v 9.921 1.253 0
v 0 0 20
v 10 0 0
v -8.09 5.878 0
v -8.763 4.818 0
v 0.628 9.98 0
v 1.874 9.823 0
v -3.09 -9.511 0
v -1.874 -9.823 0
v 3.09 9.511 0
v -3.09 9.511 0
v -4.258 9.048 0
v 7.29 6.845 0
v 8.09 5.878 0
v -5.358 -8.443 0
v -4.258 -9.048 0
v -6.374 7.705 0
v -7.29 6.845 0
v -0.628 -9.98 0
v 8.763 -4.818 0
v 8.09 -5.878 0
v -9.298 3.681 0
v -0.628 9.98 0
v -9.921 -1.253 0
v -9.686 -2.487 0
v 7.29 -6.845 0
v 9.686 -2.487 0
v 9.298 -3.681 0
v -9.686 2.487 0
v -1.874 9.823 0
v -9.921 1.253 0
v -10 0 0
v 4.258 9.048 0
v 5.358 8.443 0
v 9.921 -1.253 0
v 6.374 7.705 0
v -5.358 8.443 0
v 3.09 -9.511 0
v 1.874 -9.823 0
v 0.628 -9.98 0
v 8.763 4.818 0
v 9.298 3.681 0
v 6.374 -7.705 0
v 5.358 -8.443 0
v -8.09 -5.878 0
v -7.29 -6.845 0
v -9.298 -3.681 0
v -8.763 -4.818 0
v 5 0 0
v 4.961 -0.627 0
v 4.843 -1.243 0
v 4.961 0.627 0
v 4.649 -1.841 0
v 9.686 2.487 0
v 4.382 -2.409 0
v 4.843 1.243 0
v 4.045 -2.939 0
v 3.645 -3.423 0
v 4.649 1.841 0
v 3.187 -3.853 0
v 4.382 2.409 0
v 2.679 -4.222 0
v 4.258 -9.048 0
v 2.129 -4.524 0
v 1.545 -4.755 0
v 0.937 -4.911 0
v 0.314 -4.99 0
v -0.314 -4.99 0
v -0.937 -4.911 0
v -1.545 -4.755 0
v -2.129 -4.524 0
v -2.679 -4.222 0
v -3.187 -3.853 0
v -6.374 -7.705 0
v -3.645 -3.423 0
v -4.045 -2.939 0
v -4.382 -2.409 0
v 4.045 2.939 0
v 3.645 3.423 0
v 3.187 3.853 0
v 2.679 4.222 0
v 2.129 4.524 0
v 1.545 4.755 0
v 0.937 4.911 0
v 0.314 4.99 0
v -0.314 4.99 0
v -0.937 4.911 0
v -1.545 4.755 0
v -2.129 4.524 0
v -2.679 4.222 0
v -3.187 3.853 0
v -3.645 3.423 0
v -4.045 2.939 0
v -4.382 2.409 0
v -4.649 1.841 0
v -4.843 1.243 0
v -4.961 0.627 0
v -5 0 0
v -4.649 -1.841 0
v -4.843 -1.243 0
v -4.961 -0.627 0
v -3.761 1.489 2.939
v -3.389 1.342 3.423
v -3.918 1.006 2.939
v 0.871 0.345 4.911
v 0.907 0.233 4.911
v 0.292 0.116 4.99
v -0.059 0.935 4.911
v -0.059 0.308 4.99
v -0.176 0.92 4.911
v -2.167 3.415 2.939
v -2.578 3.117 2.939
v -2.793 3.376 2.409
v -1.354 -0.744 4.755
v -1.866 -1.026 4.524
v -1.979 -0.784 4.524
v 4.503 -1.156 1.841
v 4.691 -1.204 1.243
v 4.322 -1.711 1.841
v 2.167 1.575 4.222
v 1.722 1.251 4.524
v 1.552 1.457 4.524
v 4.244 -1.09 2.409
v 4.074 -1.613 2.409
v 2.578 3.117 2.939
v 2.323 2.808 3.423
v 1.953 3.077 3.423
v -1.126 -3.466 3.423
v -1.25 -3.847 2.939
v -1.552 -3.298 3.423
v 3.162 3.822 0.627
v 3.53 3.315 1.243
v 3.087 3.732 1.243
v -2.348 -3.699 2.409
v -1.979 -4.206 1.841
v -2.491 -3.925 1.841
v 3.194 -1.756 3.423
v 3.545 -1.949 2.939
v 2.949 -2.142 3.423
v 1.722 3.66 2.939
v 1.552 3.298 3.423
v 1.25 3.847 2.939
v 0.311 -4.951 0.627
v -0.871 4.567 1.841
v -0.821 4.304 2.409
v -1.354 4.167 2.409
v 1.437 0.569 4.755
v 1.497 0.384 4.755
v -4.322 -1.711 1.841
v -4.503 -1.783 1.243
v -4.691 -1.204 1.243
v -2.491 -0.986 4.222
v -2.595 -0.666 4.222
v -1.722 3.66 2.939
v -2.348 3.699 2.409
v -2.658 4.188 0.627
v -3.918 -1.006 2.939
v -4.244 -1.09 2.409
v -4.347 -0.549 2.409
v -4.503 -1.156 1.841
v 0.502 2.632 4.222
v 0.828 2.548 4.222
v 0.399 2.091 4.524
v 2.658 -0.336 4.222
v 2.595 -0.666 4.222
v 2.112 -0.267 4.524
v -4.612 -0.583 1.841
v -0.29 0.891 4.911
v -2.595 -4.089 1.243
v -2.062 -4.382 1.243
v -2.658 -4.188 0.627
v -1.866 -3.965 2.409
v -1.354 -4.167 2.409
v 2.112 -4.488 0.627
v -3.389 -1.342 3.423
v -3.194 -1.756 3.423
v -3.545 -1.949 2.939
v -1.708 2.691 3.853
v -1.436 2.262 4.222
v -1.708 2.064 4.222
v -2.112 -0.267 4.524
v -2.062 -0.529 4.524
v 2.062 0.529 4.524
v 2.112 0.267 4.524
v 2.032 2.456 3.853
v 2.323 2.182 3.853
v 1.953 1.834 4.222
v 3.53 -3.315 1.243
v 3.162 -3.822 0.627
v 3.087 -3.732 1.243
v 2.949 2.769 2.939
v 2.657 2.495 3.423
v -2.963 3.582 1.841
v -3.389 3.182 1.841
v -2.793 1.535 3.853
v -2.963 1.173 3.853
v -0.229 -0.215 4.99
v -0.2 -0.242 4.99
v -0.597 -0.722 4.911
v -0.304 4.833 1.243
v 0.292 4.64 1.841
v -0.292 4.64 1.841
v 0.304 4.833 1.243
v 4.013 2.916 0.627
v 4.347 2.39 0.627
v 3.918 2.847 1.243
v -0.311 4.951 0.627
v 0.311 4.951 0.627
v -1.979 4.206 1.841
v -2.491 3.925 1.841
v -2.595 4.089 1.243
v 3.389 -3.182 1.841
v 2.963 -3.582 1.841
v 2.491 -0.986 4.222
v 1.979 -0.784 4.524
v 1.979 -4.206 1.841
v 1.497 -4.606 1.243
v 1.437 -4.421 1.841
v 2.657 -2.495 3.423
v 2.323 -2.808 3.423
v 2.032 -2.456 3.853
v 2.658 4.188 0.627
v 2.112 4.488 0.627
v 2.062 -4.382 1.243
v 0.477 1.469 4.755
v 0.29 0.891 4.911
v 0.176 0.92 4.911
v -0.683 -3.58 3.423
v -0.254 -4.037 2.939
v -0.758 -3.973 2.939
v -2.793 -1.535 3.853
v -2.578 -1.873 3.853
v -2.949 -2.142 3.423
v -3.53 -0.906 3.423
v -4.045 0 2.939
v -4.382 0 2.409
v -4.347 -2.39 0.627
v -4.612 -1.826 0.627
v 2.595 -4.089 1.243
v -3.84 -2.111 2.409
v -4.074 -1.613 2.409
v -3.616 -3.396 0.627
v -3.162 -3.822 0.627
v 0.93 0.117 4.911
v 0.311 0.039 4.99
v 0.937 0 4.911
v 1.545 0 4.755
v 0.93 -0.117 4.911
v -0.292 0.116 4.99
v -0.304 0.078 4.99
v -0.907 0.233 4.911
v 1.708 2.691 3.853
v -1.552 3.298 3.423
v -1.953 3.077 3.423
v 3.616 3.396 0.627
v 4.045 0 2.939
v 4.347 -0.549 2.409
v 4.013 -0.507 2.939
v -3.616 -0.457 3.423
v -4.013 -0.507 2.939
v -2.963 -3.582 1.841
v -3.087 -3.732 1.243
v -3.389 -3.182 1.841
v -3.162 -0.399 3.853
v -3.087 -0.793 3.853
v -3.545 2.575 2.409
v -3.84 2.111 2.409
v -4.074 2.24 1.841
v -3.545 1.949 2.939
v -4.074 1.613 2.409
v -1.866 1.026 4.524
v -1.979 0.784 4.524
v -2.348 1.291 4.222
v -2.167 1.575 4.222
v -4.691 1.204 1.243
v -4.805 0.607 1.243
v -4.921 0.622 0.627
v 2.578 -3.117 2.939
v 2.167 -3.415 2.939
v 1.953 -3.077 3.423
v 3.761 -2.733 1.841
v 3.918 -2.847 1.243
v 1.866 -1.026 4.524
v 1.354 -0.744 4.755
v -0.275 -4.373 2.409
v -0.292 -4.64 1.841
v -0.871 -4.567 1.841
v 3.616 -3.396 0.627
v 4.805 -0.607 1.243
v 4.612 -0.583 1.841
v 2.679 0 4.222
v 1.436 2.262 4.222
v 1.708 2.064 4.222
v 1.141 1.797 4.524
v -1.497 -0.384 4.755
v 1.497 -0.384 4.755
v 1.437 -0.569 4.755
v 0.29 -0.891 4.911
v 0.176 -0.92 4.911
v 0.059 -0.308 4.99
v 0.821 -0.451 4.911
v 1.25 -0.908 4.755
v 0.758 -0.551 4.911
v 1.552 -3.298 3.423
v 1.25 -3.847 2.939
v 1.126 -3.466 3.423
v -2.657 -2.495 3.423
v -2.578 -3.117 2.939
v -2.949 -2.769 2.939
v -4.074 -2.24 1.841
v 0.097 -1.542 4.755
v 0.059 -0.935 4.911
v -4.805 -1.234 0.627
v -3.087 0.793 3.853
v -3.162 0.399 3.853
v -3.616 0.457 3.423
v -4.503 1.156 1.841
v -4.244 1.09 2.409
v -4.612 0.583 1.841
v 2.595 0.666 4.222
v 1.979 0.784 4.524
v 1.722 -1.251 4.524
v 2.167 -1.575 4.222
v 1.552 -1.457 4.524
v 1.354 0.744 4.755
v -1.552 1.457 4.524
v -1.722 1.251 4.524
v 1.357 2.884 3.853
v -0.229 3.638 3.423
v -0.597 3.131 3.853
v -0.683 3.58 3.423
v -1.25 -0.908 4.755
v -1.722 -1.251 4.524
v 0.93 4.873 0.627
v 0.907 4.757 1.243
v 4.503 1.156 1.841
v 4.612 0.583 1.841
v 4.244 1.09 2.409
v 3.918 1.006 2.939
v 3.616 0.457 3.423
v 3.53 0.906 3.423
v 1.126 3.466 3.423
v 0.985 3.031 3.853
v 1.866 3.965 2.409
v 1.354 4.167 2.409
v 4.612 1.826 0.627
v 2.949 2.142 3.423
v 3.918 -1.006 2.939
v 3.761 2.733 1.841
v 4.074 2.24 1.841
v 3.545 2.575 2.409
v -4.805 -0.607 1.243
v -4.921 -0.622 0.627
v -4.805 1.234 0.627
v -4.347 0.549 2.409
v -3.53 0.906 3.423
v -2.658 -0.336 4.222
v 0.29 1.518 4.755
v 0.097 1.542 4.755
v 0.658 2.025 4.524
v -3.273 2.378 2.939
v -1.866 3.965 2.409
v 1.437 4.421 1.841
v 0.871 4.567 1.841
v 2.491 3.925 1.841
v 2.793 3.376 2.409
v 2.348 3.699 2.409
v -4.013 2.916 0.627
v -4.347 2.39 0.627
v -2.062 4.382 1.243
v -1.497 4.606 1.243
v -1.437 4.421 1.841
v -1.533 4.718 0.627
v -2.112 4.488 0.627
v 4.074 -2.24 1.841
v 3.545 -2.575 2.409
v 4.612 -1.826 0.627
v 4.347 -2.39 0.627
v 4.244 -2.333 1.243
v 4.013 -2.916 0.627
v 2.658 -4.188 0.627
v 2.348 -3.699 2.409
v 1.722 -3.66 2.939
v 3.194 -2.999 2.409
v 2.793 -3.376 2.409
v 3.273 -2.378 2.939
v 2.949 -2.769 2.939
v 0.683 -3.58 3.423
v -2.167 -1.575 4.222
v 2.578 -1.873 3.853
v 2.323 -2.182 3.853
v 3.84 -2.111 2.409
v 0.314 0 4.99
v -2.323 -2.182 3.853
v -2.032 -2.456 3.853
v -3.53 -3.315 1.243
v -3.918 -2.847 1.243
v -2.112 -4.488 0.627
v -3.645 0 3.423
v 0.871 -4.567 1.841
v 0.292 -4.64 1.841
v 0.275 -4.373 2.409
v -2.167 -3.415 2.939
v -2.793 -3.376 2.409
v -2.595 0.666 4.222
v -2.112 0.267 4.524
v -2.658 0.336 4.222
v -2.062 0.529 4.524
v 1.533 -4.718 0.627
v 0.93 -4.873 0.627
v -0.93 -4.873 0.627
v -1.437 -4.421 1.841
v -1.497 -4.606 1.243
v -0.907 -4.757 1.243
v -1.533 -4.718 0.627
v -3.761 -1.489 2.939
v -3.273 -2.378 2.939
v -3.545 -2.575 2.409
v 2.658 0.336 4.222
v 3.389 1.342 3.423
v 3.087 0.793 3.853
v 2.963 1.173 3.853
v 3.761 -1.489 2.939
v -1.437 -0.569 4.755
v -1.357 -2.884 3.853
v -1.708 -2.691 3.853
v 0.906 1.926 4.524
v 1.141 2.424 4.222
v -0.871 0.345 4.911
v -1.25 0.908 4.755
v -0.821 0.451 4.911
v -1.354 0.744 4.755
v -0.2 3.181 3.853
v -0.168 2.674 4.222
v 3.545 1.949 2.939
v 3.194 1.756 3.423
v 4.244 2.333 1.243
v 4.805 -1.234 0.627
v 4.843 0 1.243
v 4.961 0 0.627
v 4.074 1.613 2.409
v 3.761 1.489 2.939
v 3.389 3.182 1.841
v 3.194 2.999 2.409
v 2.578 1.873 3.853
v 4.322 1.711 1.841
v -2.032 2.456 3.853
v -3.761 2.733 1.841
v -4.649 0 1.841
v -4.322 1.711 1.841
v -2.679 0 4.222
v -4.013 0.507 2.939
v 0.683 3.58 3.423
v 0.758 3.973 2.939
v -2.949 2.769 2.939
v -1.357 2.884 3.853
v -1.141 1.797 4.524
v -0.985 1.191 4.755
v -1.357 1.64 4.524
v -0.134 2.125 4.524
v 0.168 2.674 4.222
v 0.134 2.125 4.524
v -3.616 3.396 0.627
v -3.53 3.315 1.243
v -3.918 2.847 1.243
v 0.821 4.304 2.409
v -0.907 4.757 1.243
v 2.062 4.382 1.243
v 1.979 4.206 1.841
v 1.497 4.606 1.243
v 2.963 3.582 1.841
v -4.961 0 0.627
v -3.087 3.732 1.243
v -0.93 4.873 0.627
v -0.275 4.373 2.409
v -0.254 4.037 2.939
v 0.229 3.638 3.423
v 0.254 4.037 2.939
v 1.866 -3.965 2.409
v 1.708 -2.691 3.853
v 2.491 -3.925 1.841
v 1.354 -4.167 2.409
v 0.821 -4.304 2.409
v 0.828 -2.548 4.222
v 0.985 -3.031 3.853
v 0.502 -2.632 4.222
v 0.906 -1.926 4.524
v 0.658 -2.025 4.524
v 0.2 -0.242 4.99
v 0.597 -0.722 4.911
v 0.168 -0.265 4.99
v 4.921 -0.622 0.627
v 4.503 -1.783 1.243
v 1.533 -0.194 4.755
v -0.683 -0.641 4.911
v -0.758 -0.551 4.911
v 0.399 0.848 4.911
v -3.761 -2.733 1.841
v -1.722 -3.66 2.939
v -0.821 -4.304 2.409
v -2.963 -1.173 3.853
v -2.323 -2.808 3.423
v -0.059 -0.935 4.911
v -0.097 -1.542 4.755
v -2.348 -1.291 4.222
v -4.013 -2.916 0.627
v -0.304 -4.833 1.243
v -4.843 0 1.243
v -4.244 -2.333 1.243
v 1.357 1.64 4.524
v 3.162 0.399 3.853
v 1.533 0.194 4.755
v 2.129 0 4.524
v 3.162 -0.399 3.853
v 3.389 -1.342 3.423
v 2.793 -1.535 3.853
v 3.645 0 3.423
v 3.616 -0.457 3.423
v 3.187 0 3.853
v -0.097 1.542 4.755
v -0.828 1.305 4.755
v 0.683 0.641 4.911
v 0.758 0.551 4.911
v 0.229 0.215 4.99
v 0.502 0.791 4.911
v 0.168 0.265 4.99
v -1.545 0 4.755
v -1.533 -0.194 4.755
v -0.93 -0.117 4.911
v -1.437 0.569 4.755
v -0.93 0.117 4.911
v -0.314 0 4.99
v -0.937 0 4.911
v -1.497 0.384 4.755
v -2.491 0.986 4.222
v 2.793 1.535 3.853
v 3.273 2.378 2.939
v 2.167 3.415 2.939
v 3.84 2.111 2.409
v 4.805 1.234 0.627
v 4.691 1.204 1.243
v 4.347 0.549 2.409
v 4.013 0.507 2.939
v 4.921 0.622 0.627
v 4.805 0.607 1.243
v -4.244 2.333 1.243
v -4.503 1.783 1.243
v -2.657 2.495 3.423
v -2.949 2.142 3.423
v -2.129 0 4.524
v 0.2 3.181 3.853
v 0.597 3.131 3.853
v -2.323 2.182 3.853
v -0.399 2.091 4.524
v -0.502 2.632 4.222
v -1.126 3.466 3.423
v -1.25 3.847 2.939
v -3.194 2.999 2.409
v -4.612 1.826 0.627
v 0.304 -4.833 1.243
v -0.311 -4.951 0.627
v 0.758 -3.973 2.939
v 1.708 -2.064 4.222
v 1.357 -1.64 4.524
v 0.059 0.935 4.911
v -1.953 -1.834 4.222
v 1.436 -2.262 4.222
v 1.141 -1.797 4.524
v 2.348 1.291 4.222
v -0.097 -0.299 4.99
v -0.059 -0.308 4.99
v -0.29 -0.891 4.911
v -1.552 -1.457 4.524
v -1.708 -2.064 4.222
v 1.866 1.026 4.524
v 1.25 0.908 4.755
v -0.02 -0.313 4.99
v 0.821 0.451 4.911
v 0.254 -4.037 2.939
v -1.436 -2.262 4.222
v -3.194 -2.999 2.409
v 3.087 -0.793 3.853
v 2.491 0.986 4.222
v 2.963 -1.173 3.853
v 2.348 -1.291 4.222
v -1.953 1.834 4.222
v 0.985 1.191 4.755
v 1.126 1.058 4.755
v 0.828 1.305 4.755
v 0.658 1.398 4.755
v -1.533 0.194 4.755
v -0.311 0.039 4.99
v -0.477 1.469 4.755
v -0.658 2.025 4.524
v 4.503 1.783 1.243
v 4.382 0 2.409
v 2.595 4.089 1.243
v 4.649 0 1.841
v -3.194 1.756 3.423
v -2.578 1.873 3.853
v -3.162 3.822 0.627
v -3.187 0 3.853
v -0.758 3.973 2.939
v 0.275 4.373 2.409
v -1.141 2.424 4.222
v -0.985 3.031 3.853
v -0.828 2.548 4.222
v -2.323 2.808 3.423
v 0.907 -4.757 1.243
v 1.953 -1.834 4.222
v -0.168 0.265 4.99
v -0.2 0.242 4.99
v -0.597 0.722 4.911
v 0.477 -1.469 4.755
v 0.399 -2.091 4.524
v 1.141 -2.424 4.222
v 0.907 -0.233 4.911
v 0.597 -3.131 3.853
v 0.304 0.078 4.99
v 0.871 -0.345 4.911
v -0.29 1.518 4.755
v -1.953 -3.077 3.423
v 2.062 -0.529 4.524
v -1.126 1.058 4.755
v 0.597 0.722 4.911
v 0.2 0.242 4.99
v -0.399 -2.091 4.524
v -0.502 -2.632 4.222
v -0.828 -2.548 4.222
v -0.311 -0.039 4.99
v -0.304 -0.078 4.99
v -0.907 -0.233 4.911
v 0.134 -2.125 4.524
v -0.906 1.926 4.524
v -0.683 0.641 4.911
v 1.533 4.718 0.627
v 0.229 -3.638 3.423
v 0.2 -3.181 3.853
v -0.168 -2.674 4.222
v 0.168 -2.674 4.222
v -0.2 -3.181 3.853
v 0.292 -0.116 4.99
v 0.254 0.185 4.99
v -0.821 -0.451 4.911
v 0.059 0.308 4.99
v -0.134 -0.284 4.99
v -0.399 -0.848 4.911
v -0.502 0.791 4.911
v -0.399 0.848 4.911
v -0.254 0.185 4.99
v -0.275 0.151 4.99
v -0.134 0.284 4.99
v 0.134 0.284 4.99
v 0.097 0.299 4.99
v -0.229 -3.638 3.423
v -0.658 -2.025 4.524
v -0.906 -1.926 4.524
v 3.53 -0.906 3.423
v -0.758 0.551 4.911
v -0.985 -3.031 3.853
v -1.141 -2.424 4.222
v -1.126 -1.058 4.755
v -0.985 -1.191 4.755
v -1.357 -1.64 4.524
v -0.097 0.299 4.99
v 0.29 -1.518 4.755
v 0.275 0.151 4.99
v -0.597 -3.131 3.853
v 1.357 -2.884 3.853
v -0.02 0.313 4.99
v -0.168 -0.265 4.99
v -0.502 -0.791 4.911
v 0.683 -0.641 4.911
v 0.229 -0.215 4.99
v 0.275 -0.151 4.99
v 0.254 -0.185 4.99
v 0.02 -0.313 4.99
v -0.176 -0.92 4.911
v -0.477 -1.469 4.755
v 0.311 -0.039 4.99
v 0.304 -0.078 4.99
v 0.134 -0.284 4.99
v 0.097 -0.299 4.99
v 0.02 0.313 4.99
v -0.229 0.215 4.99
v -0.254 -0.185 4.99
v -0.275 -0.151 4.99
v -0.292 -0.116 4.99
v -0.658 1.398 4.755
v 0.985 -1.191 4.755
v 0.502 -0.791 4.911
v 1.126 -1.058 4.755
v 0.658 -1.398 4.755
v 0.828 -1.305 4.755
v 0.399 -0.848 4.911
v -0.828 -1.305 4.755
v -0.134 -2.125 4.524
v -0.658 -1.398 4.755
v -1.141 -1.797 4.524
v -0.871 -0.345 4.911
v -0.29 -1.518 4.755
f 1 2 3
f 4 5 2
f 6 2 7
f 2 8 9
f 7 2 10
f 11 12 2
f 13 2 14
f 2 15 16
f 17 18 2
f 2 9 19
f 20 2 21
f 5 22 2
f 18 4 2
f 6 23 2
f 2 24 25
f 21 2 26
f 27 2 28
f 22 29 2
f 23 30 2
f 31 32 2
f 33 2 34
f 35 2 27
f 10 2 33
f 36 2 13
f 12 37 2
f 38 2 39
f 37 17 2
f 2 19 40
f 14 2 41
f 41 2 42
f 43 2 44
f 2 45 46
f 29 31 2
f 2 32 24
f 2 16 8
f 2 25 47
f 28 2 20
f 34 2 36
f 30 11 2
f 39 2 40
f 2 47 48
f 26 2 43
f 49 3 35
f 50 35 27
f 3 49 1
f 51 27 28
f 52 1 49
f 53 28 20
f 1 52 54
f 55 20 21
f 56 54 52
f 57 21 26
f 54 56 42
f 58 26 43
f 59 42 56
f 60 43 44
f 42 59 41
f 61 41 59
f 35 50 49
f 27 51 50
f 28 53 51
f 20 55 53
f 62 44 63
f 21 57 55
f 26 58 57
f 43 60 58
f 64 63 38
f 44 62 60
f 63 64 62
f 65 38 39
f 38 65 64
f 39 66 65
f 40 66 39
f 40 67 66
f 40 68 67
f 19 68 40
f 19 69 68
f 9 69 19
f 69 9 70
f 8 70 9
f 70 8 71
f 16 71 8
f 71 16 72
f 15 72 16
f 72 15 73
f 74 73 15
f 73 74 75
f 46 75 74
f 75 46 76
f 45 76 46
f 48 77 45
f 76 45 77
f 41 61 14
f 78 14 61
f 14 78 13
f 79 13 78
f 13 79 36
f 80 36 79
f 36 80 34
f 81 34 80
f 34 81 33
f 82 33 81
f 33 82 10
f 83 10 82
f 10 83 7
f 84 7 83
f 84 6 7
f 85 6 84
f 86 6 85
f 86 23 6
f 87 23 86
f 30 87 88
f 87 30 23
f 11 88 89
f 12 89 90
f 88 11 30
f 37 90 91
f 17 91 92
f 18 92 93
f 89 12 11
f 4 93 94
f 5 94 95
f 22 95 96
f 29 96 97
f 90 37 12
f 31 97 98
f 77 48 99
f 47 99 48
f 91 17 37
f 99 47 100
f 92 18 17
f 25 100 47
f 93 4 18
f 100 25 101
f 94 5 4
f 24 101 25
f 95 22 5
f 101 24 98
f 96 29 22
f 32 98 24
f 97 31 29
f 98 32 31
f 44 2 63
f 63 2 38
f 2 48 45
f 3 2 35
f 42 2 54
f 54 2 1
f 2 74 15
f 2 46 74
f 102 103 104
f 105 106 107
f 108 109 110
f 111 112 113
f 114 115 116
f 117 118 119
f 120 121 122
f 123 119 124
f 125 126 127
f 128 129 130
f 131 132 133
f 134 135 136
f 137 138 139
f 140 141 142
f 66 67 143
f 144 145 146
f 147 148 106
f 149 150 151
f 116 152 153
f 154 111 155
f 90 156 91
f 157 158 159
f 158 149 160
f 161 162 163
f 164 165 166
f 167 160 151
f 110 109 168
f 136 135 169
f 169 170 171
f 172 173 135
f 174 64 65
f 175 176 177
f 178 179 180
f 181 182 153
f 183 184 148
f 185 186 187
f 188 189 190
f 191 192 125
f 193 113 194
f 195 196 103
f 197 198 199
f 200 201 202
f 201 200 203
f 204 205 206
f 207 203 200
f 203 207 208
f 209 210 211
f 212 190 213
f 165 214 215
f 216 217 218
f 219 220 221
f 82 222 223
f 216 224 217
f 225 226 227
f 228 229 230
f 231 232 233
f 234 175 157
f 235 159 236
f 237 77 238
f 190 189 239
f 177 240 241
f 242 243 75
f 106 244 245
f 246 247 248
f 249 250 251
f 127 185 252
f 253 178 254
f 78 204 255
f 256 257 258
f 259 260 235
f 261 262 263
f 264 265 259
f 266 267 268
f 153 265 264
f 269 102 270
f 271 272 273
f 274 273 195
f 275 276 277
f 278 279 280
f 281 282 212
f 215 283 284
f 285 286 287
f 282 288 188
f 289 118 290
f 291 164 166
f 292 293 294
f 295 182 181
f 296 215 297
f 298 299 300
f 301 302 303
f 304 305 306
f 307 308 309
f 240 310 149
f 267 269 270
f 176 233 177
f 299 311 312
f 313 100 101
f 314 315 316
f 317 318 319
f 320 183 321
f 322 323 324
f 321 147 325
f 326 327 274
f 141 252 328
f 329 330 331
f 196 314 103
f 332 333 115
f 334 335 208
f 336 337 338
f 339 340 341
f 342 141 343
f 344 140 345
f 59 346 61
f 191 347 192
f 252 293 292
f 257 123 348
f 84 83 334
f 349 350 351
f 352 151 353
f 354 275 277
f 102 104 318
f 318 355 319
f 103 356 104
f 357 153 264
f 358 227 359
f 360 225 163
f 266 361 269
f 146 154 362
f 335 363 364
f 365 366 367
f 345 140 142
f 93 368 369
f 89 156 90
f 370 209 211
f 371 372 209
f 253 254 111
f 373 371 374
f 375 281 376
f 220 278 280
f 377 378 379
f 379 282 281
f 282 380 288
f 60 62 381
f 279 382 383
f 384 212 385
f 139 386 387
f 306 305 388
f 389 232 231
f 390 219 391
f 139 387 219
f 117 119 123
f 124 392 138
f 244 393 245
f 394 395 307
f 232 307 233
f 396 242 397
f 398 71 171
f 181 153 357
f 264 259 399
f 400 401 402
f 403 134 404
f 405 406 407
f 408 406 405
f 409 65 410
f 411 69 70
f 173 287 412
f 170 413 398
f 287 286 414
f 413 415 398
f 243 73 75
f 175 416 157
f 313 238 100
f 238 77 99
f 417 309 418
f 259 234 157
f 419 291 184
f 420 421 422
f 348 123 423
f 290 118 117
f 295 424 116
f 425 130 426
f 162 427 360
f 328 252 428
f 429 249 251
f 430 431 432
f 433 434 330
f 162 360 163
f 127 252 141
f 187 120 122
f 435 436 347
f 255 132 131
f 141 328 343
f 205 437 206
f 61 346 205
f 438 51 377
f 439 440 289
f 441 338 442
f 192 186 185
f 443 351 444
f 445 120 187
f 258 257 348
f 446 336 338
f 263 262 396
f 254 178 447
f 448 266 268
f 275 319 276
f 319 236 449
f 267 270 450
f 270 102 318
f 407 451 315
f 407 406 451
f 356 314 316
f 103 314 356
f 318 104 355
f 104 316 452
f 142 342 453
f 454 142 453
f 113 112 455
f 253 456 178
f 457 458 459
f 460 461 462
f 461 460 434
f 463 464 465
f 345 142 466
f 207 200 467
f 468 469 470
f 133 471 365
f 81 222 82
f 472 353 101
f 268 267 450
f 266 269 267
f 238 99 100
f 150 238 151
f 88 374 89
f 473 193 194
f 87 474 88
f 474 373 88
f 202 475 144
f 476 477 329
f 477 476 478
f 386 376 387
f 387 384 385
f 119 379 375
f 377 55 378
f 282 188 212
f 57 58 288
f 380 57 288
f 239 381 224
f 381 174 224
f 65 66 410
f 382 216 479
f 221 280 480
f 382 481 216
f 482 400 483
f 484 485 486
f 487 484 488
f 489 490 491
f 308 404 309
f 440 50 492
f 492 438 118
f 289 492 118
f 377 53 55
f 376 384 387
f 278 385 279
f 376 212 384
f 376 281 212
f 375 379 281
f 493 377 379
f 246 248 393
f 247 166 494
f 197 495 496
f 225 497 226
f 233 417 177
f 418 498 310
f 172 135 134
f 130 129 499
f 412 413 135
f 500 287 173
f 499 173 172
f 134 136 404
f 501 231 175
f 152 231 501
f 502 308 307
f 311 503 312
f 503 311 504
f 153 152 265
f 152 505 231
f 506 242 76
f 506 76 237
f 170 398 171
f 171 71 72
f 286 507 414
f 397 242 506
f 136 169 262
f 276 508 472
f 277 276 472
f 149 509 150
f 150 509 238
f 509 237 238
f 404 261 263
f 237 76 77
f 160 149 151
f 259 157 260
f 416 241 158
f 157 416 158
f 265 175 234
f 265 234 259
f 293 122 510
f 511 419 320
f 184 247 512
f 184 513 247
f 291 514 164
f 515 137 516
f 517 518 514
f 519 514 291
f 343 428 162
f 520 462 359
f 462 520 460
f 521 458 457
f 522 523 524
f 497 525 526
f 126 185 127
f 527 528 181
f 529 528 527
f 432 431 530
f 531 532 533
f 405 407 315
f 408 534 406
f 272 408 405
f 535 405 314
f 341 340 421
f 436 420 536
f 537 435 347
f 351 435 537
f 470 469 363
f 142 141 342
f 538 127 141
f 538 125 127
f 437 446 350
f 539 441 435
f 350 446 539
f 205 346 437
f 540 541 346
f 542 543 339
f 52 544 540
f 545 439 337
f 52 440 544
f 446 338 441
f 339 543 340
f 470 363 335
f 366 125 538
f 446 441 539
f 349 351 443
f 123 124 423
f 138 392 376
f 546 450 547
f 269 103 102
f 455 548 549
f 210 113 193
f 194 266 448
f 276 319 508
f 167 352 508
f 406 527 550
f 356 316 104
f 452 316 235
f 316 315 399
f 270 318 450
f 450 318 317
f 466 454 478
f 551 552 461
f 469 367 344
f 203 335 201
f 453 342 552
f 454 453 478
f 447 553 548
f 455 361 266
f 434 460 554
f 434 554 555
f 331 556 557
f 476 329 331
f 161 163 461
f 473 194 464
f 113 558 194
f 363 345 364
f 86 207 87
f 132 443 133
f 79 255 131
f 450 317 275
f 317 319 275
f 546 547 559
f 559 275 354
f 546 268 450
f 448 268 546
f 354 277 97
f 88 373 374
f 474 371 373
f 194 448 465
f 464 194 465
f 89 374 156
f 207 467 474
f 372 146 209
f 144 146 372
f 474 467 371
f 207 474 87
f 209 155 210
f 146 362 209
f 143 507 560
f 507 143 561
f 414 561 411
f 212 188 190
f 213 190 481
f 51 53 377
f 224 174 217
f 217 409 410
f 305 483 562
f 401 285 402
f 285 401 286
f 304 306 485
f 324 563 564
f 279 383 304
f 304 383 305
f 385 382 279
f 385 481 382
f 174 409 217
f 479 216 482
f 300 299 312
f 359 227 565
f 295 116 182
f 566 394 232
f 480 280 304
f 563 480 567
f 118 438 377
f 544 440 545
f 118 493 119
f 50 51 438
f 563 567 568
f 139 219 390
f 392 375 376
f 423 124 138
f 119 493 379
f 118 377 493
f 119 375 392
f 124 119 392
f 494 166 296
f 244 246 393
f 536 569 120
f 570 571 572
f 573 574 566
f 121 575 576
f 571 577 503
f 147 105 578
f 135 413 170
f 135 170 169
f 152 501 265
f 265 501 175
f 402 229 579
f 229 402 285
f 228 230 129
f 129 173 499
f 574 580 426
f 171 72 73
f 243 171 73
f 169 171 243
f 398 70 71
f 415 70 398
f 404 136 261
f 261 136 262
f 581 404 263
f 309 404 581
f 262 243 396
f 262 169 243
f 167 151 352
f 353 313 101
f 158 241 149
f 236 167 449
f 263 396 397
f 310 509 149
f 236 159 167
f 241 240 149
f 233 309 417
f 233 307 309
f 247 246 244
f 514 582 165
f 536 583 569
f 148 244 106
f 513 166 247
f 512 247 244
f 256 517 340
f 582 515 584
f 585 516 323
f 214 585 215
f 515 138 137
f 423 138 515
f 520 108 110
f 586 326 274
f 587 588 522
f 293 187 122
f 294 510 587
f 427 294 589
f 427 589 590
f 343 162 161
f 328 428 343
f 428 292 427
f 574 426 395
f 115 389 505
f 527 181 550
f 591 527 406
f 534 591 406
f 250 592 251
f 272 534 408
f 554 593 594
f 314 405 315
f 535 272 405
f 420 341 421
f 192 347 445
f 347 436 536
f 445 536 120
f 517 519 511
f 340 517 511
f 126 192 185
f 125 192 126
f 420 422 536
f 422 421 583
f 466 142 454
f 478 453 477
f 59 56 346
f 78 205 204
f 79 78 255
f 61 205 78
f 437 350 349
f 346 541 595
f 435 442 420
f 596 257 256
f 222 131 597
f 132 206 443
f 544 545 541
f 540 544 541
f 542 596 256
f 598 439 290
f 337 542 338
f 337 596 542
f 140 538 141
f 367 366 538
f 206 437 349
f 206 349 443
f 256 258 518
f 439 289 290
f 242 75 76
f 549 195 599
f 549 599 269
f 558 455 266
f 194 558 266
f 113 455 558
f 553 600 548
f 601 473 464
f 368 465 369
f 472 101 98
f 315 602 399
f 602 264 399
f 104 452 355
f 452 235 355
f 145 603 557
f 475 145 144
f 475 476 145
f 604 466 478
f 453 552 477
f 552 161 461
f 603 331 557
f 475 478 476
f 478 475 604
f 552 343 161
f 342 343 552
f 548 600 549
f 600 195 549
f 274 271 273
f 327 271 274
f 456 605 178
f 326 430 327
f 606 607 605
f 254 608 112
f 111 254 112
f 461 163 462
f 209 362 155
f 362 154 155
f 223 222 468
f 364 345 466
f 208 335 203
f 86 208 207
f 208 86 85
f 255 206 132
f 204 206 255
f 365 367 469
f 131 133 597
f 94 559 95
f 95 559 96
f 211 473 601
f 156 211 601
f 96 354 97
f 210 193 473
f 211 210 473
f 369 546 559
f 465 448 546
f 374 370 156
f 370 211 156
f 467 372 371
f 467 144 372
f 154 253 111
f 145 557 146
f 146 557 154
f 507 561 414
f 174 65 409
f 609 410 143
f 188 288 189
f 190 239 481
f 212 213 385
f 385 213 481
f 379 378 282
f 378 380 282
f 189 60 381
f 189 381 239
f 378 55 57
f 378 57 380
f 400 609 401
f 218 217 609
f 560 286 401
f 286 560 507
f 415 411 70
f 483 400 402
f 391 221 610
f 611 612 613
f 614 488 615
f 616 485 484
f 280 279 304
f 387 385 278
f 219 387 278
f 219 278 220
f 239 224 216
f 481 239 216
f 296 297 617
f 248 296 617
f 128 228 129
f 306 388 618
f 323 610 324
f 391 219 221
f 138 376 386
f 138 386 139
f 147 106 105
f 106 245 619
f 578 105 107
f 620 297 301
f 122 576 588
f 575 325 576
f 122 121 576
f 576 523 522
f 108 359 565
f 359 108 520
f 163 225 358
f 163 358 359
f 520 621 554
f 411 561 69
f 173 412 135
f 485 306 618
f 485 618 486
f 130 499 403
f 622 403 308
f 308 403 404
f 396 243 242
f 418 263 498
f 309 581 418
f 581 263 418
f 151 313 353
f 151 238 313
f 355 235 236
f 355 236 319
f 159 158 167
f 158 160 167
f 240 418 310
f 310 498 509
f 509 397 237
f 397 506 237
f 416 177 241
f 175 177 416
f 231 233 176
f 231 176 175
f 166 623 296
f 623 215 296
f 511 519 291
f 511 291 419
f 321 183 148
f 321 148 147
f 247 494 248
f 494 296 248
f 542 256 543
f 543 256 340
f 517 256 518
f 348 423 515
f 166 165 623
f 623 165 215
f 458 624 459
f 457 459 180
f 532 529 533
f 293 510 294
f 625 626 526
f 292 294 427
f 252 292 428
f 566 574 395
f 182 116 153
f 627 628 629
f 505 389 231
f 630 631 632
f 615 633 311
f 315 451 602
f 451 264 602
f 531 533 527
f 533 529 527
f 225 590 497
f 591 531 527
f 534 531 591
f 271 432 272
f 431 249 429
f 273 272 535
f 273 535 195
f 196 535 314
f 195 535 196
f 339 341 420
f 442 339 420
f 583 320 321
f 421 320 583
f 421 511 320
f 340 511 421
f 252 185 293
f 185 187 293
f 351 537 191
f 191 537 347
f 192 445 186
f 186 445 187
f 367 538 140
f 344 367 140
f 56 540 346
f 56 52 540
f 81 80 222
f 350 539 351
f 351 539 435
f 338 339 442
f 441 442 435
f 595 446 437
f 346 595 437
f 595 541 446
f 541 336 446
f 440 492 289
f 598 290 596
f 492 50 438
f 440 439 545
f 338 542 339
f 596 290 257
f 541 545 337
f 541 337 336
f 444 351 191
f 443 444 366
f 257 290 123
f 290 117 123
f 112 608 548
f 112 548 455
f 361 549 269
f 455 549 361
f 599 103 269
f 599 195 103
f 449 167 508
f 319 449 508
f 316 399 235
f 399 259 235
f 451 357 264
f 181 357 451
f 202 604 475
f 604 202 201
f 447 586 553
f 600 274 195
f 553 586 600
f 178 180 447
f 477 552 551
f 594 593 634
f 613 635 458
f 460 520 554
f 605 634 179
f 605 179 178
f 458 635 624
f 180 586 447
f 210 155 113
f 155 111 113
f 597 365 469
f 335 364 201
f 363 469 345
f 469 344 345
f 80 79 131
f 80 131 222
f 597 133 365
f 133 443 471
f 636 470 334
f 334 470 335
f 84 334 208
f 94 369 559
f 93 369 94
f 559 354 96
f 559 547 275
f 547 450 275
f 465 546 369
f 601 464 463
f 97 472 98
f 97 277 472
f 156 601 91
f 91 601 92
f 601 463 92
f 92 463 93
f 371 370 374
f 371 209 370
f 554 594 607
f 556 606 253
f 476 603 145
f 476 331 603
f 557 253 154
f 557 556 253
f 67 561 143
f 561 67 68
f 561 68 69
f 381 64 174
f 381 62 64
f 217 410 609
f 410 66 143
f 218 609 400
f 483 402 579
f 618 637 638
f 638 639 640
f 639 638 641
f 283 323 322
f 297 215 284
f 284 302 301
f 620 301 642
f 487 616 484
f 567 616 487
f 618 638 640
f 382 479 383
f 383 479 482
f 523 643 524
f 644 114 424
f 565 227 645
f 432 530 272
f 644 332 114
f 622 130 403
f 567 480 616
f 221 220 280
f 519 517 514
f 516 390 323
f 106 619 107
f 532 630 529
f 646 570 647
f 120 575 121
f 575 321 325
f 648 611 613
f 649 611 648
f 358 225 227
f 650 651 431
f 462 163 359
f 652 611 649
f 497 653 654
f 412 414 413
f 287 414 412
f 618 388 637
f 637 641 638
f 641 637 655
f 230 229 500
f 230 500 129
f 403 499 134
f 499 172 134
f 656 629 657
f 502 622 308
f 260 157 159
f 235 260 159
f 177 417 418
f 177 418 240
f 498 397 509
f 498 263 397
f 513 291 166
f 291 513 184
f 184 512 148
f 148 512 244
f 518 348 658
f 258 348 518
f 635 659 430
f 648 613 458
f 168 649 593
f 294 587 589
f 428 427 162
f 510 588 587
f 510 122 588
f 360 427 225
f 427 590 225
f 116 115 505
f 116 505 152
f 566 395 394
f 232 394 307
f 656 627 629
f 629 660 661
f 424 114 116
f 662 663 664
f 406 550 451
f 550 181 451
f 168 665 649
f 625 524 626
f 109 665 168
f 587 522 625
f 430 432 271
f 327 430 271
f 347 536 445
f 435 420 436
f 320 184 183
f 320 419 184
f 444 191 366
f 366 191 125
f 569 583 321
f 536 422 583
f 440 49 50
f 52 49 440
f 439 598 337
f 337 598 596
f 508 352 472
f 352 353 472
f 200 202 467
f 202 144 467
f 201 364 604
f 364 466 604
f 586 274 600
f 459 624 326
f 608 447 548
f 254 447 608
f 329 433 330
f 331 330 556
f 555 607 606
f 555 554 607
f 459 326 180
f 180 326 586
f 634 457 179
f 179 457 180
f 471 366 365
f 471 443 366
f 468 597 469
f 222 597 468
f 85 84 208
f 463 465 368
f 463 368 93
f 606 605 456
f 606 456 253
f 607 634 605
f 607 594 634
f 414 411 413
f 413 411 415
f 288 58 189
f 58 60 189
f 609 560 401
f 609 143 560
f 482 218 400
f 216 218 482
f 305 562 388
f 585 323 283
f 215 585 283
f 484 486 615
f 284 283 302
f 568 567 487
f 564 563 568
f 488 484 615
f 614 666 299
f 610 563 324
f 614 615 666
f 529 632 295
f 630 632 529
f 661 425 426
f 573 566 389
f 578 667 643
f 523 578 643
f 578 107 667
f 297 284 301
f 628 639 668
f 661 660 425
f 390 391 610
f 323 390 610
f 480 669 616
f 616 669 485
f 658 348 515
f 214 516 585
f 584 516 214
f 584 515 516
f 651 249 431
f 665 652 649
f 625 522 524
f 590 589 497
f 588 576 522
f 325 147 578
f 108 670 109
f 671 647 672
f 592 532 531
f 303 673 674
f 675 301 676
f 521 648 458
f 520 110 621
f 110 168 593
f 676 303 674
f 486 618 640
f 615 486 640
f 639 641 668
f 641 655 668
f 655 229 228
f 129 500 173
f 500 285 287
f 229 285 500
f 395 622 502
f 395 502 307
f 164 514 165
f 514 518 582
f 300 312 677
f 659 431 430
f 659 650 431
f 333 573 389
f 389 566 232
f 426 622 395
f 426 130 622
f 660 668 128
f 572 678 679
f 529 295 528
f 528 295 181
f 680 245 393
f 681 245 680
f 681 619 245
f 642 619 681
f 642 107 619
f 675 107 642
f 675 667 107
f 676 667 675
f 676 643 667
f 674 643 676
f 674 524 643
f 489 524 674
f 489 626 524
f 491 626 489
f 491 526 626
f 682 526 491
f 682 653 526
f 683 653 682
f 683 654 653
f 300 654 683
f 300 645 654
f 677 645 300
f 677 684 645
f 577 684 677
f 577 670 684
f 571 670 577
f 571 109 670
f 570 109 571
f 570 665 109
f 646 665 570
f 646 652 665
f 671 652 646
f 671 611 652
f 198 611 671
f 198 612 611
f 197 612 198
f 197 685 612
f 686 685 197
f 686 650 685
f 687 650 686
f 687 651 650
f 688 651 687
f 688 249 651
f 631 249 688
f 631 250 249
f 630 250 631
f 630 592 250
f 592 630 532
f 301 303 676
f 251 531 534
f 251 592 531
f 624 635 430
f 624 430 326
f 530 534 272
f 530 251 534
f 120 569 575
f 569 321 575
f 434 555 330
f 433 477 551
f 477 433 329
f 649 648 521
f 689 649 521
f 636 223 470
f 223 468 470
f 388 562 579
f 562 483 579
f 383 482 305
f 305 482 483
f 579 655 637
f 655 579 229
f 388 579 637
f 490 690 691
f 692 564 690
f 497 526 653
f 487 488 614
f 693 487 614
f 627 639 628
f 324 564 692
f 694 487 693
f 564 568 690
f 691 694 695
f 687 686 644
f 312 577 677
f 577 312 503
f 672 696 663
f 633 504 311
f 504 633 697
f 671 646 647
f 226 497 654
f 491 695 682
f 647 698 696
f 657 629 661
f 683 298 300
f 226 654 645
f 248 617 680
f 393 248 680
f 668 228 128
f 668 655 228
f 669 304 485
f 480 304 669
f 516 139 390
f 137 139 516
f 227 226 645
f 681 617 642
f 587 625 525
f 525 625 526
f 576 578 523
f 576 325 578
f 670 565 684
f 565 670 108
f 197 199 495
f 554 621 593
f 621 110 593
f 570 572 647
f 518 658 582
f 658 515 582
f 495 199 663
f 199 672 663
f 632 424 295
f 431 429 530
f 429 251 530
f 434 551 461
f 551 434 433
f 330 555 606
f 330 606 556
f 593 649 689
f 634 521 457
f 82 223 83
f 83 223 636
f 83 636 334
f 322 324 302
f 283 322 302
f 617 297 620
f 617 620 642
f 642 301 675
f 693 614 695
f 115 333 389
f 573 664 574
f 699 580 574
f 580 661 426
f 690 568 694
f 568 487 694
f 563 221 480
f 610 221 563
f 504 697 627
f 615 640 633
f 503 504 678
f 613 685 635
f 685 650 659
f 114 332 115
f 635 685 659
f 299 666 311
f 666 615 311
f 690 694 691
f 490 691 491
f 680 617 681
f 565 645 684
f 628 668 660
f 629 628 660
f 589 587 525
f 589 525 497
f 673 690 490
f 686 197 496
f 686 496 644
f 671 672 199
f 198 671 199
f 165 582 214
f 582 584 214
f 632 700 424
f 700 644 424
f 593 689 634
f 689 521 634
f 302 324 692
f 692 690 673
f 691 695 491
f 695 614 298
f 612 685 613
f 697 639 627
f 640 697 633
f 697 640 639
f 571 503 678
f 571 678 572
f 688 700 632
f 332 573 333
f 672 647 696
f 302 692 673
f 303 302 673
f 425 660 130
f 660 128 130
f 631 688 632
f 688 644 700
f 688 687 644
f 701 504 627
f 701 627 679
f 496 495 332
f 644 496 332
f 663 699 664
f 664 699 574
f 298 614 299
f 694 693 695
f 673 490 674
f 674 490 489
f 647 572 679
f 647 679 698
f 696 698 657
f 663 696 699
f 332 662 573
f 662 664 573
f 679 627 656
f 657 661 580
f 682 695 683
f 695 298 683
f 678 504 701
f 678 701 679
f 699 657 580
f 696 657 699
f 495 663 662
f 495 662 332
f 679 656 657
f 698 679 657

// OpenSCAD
difference() {
  cylinder(h = 20, r1 = 10, r2 = 0);
  sphere(5);
}
$fn = 50;
